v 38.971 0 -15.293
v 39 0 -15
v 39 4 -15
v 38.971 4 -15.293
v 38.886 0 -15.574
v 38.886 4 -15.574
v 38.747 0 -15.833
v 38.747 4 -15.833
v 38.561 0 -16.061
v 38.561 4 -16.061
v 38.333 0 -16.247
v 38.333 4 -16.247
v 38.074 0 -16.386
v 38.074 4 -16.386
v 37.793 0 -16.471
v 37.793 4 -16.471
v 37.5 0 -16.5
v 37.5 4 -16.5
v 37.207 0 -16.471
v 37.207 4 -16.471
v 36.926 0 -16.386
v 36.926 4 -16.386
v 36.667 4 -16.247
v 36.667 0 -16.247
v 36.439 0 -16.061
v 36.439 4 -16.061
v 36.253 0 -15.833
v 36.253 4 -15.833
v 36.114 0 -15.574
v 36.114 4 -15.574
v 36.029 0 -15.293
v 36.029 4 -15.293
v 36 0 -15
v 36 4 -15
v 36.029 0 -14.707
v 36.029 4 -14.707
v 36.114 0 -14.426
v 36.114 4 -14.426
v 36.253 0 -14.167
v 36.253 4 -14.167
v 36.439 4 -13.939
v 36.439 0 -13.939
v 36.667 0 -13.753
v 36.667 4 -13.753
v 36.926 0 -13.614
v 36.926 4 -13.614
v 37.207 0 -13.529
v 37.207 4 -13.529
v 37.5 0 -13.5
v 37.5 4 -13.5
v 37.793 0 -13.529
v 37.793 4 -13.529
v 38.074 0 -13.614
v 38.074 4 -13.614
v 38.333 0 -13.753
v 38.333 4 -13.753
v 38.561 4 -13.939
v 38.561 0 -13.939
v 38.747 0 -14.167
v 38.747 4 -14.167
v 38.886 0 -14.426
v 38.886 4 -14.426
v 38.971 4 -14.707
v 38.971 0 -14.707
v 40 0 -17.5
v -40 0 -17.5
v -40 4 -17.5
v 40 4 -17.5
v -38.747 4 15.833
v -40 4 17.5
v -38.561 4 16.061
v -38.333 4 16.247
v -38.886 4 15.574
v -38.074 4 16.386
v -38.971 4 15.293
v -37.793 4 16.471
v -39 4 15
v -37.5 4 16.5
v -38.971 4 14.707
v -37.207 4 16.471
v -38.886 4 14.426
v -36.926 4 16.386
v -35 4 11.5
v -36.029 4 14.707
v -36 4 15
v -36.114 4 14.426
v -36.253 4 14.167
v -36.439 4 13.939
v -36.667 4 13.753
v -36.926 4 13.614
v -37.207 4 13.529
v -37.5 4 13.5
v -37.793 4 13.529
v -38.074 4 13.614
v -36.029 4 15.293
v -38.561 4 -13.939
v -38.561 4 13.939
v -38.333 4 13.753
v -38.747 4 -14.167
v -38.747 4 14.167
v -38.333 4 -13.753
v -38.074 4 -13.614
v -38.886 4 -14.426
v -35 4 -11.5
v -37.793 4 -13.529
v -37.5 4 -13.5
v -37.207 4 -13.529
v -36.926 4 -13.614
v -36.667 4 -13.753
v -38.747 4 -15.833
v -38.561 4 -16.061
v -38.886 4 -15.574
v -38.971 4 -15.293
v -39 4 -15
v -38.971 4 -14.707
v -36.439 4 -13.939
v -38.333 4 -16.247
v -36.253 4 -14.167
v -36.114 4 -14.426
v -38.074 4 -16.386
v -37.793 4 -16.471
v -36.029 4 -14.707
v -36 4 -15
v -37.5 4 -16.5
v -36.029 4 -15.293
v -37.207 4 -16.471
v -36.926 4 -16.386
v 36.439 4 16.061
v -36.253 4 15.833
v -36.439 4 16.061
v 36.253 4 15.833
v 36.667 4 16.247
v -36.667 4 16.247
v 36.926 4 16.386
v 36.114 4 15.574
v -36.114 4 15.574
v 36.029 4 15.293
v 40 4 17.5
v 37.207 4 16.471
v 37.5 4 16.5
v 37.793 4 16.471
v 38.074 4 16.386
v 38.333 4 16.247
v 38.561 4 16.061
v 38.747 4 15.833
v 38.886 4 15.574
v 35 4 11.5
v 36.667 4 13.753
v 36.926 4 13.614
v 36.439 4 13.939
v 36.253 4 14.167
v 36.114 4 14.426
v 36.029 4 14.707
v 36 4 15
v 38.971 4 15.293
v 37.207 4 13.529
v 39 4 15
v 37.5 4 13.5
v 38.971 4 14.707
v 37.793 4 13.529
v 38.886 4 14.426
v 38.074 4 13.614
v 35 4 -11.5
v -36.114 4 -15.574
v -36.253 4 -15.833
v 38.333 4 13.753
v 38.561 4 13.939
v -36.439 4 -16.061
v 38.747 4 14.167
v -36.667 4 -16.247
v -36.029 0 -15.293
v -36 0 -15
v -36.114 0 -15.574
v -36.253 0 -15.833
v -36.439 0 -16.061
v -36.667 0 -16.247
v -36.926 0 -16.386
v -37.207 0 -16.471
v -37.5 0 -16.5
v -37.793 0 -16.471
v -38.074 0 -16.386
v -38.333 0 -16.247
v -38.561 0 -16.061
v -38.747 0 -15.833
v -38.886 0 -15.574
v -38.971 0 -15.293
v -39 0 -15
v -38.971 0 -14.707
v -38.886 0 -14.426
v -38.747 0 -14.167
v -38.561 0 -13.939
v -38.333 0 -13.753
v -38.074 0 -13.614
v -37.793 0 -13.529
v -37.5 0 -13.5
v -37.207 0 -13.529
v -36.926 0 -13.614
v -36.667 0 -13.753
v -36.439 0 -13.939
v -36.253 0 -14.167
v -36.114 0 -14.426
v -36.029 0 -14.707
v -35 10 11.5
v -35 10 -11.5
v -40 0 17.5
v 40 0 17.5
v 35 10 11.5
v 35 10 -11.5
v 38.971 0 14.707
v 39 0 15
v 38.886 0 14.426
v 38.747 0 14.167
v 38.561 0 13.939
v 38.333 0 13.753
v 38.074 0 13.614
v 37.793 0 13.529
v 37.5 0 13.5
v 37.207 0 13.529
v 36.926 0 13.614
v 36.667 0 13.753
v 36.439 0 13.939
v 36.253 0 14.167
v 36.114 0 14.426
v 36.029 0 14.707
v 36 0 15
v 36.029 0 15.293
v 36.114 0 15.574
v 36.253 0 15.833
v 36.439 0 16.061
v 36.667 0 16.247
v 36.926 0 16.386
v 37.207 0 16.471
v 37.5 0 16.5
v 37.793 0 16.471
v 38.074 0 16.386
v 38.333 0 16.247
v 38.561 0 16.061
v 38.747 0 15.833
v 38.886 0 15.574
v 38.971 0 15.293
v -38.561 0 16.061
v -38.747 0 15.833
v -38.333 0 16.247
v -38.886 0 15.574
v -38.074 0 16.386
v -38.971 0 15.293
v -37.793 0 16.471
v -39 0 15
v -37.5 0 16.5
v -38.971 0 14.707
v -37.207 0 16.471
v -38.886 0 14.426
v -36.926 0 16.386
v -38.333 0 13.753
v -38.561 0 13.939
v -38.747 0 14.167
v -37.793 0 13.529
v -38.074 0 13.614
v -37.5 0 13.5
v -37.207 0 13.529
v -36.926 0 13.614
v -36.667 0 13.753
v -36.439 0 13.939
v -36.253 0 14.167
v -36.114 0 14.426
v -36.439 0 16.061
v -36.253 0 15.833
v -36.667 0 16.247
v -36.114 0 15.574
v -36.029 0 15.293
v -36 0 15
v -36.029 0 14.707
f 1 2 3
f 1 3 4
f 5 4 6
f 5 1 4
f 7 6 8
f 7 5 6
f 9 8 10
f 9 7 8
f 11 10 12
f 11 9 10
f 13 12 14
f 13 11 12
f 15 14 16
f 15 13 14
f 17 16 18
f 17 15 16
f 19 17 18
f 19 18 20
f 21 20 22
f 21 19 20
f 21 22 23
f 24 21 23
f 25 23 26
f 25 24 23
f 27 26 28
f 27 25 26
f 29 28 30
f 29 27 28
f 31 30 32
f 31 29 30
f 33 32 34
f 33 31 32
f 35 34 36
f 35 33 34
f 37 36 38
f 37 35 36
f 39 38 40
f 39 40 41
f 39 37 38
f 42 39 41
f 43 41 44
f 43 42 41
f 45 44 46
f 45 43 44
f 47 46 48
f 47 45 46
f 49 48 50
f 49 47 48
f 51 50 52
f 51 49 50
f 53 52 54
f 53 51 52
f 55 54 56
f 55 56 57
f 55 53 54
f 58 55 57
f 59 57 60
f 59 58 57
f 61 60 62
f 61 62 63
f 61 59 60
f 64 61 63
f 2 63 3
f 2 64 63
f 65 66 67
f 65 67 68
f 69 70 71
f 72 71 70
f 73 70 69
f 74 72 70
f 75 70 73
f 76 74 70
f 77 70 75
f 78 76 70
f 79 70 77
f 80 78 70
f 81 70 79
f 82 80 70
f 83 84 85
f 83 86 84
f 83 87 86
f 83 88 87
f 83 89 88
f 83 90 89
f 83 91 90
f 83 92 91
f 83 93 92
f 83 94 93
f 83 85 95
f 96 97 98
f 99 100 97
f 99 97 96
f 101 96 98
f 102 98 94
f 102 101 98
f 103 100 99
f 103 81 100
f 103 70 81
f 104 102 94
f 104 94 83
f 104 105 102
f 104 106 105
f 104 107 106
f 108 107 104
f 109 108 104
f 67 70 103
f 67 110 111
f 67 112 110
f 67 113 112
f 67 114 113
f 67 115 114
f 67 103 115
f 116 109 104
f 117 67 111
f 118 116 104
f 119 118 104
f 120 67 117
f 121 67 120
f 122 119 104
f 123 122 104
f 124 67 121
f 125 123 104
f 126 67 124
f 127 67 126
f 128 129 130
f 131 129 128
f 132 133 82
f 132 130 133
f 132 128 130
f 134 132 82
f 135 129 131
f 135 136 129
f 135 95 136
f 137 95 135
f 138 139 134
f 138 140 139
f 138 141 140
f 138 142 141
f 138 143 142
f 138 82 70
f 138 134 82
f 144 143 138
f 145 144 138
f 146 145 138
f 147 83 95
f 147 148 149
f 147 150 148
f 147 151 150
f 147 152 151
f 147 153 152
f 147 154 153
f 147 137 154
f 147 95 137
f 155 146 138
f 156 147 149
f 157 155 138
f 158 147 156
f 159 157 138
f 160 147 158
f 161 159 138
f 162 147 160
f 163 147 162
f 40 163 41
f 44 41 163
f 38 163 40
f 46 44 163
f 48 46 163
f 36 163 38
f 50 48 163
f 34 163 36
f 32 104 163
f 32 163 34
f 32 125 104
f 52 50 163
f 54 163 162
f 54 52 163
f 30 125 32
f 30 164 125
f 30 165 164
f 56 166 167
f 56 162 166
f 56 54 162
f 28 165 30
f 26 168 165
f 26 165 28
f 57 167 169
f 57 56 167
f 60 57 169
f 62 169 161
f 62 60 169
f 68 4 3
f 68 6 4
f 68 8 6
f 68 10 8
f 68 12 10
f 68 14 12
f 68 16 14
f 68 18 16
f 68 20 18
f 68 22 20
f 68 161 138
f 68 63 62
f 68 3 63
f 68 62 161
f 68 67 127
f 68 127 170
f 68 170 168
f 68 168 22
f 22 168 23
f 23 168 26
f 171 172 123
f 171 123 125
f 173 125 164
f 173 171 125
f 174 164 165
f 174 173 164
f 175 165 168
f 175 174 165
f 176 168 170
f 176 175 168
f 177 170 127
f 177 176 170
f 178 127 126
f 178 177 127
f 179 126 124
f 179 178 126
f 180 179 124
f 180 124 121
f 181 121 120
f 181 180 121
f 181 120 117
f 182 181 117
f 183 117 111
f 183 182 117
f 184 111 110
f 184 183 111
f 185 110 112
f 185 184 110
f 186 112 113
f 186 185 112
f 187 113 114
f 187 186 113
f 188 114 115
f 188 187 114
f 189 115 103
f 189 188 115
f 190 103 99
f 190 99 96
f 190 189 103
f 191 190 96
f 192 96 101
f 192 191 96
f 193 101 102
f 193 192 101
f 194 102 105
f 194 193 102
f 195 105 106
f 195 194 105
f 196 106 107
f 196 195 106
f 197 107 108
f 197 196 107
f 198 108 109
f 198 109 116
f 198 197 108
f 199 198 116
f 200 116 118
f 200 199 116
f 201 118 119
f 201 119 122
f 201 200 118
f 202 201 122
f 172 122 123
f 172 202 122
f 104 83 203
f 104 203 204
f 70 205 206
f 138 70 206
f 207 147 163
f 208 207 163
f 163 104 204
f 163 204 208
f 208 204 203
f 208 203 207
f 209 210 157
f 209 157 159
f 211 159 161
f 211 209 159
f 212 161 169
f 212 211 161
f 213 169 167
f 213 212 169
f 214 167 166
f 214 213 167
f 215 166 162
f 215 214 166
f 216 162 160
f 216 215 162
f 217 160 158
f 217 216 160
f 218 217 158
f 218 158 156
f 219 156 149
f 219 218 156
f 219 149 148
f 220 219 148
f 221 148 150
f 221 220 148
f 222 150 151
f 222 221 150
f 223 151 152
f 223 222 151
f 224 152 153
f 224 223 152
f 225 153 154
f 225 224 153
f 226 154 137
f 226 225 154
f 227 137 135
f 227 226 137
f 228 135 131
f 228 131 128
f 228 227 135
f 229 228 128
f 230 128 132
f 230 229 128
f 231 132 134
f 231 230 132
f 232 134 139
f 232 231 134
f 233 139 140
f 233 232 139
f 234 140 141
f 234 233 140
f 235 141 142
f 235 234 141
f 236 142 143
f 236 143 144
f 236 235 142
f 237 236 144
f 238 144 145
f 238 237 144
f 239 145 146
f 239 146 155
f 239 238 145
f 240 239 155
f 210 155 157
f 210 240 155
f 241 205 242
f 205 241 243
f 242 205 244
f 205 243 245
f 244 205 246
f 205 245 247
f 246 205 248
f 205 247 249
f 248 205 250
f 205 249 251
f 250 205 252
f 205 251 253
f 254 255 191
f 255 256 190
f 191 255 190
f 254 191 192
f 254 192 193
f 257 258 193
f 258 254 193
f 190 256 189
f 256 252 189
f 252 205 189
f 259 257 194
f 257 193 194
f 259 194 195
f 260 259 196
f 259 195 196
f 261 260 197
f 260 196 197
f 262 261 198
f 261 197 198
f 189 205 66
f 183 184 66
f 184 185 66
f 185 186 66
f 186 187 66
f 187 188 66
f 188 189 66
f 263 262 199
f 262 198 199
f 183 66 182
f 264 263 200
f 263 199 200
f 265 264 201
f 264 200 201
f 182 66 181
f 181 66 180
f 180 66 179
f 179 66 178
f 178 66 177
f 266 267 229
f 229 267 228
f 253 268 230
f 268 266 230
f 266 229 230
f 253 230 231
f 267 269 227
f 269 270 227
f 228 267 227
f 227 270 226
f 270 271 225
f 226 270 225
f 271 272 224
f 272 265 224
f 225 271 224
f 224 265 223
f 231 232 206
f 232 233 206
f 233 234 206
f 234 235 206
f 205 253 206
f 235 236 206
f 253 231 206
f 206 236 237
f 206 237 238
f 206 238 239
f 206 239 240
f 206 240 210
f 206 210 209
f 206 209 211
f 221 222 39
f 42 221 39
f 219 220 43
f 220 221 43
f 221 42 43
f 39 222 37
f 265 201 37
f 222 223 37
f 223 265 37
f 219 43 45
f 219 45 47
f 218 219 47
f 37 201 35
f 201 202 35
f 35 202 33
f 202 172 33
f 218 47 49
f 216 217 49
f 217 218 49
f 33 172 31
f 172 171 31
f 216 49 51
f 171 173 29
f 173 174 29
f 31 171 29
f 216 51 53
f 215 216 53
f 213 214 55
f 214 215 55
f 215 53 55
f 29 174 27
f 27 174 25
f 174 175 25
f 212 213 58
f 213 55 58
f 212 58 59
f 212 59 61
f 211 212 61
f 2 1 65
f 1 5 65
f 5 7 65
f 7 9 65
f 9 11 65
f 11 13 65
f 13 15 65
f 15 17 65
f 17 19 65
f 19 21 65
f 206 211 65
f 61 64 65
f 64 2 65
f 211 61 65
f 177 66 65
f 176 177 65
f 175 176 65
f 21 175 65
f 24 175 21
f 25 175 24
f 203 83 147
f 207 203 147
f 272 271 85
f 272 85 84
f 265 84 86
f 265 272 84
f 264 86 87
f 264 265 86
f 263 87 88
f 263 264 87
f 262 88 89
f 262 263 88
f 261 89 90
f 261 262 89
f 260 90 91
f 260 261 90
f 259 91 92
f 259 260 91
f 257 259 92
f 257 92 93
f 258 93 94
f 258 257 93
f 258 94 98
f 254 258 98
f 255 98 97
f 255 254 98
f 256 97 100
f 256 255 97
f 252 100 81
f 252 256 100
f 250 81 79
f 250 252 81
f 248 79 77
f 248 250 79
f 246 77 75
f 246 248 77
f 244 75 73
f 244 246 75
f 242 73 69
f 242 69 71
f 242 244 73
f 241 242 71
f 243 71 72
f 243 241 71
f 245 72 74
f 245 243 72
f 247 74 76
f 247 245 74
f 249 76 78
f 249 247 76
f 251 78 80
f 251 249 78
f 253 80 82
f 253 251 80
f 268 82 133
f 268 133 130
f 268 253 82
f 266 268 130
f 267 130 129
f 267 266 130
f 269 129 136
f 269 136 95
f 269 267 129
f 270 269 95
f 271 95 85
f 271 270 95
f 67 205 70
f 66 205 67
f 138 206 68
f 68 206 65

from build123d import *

# Parameters (mm, degrees)
SZKIC1_W                    = 80
SZKIC1_H                    = 35
SZKIC1_R                    = 1.5
DODANIE_WYCI_GNI_CIE1_DEPTH = 4
SZKIC2_W                    = 70
SZKIC2_H                    = 23
DODANIE_WYCI_GNI_CIE2_DEPTH = 6


with BuildPart() as part:
    # Szkic1 → Dodanie-wyciągnięcie1 (new body)
    with BuildSketch(Plane(origin=(0, 0, 0), x_dir=(1, 0, 0), z_dir=(0, 1, 0))):
        Rectangle(SZKIC1_W, SZKIC1_H)
        with Locations((-37.5, 15)):
            Circle(SZKIC1_R, mode=Mode.SUBTRACT)
        with Locations((-37.5, -15)):
            Circle(SZKIC1_R, mode=Mode.SUBTRACT)
        with Locations((37.5, -15)):
            Circle(SZKIC1_R, mode=Mode.SUBTRACT)
        with Locations((37.5, 15)):
            Circle(SZKIC1_R, mode=Mode.SUBTRACT)
    extrude(amount=DODANIE_WYCI_GNI_CIE1_DEPTH)

    # Szkic2 → Dodanie-wyciągnięcie2 (add)
    with BuildSketch(Plane(origin=(0, 4, 0), x_dir=(1, 0, 0), z_dir=(0, 1, 0))):
        Rectangle(SZKIC2_W, SZKIC2_H)
    extrude(amount=DODANIE_WYCI_GNI_CIE2_DEPTH)


solid = part.part
